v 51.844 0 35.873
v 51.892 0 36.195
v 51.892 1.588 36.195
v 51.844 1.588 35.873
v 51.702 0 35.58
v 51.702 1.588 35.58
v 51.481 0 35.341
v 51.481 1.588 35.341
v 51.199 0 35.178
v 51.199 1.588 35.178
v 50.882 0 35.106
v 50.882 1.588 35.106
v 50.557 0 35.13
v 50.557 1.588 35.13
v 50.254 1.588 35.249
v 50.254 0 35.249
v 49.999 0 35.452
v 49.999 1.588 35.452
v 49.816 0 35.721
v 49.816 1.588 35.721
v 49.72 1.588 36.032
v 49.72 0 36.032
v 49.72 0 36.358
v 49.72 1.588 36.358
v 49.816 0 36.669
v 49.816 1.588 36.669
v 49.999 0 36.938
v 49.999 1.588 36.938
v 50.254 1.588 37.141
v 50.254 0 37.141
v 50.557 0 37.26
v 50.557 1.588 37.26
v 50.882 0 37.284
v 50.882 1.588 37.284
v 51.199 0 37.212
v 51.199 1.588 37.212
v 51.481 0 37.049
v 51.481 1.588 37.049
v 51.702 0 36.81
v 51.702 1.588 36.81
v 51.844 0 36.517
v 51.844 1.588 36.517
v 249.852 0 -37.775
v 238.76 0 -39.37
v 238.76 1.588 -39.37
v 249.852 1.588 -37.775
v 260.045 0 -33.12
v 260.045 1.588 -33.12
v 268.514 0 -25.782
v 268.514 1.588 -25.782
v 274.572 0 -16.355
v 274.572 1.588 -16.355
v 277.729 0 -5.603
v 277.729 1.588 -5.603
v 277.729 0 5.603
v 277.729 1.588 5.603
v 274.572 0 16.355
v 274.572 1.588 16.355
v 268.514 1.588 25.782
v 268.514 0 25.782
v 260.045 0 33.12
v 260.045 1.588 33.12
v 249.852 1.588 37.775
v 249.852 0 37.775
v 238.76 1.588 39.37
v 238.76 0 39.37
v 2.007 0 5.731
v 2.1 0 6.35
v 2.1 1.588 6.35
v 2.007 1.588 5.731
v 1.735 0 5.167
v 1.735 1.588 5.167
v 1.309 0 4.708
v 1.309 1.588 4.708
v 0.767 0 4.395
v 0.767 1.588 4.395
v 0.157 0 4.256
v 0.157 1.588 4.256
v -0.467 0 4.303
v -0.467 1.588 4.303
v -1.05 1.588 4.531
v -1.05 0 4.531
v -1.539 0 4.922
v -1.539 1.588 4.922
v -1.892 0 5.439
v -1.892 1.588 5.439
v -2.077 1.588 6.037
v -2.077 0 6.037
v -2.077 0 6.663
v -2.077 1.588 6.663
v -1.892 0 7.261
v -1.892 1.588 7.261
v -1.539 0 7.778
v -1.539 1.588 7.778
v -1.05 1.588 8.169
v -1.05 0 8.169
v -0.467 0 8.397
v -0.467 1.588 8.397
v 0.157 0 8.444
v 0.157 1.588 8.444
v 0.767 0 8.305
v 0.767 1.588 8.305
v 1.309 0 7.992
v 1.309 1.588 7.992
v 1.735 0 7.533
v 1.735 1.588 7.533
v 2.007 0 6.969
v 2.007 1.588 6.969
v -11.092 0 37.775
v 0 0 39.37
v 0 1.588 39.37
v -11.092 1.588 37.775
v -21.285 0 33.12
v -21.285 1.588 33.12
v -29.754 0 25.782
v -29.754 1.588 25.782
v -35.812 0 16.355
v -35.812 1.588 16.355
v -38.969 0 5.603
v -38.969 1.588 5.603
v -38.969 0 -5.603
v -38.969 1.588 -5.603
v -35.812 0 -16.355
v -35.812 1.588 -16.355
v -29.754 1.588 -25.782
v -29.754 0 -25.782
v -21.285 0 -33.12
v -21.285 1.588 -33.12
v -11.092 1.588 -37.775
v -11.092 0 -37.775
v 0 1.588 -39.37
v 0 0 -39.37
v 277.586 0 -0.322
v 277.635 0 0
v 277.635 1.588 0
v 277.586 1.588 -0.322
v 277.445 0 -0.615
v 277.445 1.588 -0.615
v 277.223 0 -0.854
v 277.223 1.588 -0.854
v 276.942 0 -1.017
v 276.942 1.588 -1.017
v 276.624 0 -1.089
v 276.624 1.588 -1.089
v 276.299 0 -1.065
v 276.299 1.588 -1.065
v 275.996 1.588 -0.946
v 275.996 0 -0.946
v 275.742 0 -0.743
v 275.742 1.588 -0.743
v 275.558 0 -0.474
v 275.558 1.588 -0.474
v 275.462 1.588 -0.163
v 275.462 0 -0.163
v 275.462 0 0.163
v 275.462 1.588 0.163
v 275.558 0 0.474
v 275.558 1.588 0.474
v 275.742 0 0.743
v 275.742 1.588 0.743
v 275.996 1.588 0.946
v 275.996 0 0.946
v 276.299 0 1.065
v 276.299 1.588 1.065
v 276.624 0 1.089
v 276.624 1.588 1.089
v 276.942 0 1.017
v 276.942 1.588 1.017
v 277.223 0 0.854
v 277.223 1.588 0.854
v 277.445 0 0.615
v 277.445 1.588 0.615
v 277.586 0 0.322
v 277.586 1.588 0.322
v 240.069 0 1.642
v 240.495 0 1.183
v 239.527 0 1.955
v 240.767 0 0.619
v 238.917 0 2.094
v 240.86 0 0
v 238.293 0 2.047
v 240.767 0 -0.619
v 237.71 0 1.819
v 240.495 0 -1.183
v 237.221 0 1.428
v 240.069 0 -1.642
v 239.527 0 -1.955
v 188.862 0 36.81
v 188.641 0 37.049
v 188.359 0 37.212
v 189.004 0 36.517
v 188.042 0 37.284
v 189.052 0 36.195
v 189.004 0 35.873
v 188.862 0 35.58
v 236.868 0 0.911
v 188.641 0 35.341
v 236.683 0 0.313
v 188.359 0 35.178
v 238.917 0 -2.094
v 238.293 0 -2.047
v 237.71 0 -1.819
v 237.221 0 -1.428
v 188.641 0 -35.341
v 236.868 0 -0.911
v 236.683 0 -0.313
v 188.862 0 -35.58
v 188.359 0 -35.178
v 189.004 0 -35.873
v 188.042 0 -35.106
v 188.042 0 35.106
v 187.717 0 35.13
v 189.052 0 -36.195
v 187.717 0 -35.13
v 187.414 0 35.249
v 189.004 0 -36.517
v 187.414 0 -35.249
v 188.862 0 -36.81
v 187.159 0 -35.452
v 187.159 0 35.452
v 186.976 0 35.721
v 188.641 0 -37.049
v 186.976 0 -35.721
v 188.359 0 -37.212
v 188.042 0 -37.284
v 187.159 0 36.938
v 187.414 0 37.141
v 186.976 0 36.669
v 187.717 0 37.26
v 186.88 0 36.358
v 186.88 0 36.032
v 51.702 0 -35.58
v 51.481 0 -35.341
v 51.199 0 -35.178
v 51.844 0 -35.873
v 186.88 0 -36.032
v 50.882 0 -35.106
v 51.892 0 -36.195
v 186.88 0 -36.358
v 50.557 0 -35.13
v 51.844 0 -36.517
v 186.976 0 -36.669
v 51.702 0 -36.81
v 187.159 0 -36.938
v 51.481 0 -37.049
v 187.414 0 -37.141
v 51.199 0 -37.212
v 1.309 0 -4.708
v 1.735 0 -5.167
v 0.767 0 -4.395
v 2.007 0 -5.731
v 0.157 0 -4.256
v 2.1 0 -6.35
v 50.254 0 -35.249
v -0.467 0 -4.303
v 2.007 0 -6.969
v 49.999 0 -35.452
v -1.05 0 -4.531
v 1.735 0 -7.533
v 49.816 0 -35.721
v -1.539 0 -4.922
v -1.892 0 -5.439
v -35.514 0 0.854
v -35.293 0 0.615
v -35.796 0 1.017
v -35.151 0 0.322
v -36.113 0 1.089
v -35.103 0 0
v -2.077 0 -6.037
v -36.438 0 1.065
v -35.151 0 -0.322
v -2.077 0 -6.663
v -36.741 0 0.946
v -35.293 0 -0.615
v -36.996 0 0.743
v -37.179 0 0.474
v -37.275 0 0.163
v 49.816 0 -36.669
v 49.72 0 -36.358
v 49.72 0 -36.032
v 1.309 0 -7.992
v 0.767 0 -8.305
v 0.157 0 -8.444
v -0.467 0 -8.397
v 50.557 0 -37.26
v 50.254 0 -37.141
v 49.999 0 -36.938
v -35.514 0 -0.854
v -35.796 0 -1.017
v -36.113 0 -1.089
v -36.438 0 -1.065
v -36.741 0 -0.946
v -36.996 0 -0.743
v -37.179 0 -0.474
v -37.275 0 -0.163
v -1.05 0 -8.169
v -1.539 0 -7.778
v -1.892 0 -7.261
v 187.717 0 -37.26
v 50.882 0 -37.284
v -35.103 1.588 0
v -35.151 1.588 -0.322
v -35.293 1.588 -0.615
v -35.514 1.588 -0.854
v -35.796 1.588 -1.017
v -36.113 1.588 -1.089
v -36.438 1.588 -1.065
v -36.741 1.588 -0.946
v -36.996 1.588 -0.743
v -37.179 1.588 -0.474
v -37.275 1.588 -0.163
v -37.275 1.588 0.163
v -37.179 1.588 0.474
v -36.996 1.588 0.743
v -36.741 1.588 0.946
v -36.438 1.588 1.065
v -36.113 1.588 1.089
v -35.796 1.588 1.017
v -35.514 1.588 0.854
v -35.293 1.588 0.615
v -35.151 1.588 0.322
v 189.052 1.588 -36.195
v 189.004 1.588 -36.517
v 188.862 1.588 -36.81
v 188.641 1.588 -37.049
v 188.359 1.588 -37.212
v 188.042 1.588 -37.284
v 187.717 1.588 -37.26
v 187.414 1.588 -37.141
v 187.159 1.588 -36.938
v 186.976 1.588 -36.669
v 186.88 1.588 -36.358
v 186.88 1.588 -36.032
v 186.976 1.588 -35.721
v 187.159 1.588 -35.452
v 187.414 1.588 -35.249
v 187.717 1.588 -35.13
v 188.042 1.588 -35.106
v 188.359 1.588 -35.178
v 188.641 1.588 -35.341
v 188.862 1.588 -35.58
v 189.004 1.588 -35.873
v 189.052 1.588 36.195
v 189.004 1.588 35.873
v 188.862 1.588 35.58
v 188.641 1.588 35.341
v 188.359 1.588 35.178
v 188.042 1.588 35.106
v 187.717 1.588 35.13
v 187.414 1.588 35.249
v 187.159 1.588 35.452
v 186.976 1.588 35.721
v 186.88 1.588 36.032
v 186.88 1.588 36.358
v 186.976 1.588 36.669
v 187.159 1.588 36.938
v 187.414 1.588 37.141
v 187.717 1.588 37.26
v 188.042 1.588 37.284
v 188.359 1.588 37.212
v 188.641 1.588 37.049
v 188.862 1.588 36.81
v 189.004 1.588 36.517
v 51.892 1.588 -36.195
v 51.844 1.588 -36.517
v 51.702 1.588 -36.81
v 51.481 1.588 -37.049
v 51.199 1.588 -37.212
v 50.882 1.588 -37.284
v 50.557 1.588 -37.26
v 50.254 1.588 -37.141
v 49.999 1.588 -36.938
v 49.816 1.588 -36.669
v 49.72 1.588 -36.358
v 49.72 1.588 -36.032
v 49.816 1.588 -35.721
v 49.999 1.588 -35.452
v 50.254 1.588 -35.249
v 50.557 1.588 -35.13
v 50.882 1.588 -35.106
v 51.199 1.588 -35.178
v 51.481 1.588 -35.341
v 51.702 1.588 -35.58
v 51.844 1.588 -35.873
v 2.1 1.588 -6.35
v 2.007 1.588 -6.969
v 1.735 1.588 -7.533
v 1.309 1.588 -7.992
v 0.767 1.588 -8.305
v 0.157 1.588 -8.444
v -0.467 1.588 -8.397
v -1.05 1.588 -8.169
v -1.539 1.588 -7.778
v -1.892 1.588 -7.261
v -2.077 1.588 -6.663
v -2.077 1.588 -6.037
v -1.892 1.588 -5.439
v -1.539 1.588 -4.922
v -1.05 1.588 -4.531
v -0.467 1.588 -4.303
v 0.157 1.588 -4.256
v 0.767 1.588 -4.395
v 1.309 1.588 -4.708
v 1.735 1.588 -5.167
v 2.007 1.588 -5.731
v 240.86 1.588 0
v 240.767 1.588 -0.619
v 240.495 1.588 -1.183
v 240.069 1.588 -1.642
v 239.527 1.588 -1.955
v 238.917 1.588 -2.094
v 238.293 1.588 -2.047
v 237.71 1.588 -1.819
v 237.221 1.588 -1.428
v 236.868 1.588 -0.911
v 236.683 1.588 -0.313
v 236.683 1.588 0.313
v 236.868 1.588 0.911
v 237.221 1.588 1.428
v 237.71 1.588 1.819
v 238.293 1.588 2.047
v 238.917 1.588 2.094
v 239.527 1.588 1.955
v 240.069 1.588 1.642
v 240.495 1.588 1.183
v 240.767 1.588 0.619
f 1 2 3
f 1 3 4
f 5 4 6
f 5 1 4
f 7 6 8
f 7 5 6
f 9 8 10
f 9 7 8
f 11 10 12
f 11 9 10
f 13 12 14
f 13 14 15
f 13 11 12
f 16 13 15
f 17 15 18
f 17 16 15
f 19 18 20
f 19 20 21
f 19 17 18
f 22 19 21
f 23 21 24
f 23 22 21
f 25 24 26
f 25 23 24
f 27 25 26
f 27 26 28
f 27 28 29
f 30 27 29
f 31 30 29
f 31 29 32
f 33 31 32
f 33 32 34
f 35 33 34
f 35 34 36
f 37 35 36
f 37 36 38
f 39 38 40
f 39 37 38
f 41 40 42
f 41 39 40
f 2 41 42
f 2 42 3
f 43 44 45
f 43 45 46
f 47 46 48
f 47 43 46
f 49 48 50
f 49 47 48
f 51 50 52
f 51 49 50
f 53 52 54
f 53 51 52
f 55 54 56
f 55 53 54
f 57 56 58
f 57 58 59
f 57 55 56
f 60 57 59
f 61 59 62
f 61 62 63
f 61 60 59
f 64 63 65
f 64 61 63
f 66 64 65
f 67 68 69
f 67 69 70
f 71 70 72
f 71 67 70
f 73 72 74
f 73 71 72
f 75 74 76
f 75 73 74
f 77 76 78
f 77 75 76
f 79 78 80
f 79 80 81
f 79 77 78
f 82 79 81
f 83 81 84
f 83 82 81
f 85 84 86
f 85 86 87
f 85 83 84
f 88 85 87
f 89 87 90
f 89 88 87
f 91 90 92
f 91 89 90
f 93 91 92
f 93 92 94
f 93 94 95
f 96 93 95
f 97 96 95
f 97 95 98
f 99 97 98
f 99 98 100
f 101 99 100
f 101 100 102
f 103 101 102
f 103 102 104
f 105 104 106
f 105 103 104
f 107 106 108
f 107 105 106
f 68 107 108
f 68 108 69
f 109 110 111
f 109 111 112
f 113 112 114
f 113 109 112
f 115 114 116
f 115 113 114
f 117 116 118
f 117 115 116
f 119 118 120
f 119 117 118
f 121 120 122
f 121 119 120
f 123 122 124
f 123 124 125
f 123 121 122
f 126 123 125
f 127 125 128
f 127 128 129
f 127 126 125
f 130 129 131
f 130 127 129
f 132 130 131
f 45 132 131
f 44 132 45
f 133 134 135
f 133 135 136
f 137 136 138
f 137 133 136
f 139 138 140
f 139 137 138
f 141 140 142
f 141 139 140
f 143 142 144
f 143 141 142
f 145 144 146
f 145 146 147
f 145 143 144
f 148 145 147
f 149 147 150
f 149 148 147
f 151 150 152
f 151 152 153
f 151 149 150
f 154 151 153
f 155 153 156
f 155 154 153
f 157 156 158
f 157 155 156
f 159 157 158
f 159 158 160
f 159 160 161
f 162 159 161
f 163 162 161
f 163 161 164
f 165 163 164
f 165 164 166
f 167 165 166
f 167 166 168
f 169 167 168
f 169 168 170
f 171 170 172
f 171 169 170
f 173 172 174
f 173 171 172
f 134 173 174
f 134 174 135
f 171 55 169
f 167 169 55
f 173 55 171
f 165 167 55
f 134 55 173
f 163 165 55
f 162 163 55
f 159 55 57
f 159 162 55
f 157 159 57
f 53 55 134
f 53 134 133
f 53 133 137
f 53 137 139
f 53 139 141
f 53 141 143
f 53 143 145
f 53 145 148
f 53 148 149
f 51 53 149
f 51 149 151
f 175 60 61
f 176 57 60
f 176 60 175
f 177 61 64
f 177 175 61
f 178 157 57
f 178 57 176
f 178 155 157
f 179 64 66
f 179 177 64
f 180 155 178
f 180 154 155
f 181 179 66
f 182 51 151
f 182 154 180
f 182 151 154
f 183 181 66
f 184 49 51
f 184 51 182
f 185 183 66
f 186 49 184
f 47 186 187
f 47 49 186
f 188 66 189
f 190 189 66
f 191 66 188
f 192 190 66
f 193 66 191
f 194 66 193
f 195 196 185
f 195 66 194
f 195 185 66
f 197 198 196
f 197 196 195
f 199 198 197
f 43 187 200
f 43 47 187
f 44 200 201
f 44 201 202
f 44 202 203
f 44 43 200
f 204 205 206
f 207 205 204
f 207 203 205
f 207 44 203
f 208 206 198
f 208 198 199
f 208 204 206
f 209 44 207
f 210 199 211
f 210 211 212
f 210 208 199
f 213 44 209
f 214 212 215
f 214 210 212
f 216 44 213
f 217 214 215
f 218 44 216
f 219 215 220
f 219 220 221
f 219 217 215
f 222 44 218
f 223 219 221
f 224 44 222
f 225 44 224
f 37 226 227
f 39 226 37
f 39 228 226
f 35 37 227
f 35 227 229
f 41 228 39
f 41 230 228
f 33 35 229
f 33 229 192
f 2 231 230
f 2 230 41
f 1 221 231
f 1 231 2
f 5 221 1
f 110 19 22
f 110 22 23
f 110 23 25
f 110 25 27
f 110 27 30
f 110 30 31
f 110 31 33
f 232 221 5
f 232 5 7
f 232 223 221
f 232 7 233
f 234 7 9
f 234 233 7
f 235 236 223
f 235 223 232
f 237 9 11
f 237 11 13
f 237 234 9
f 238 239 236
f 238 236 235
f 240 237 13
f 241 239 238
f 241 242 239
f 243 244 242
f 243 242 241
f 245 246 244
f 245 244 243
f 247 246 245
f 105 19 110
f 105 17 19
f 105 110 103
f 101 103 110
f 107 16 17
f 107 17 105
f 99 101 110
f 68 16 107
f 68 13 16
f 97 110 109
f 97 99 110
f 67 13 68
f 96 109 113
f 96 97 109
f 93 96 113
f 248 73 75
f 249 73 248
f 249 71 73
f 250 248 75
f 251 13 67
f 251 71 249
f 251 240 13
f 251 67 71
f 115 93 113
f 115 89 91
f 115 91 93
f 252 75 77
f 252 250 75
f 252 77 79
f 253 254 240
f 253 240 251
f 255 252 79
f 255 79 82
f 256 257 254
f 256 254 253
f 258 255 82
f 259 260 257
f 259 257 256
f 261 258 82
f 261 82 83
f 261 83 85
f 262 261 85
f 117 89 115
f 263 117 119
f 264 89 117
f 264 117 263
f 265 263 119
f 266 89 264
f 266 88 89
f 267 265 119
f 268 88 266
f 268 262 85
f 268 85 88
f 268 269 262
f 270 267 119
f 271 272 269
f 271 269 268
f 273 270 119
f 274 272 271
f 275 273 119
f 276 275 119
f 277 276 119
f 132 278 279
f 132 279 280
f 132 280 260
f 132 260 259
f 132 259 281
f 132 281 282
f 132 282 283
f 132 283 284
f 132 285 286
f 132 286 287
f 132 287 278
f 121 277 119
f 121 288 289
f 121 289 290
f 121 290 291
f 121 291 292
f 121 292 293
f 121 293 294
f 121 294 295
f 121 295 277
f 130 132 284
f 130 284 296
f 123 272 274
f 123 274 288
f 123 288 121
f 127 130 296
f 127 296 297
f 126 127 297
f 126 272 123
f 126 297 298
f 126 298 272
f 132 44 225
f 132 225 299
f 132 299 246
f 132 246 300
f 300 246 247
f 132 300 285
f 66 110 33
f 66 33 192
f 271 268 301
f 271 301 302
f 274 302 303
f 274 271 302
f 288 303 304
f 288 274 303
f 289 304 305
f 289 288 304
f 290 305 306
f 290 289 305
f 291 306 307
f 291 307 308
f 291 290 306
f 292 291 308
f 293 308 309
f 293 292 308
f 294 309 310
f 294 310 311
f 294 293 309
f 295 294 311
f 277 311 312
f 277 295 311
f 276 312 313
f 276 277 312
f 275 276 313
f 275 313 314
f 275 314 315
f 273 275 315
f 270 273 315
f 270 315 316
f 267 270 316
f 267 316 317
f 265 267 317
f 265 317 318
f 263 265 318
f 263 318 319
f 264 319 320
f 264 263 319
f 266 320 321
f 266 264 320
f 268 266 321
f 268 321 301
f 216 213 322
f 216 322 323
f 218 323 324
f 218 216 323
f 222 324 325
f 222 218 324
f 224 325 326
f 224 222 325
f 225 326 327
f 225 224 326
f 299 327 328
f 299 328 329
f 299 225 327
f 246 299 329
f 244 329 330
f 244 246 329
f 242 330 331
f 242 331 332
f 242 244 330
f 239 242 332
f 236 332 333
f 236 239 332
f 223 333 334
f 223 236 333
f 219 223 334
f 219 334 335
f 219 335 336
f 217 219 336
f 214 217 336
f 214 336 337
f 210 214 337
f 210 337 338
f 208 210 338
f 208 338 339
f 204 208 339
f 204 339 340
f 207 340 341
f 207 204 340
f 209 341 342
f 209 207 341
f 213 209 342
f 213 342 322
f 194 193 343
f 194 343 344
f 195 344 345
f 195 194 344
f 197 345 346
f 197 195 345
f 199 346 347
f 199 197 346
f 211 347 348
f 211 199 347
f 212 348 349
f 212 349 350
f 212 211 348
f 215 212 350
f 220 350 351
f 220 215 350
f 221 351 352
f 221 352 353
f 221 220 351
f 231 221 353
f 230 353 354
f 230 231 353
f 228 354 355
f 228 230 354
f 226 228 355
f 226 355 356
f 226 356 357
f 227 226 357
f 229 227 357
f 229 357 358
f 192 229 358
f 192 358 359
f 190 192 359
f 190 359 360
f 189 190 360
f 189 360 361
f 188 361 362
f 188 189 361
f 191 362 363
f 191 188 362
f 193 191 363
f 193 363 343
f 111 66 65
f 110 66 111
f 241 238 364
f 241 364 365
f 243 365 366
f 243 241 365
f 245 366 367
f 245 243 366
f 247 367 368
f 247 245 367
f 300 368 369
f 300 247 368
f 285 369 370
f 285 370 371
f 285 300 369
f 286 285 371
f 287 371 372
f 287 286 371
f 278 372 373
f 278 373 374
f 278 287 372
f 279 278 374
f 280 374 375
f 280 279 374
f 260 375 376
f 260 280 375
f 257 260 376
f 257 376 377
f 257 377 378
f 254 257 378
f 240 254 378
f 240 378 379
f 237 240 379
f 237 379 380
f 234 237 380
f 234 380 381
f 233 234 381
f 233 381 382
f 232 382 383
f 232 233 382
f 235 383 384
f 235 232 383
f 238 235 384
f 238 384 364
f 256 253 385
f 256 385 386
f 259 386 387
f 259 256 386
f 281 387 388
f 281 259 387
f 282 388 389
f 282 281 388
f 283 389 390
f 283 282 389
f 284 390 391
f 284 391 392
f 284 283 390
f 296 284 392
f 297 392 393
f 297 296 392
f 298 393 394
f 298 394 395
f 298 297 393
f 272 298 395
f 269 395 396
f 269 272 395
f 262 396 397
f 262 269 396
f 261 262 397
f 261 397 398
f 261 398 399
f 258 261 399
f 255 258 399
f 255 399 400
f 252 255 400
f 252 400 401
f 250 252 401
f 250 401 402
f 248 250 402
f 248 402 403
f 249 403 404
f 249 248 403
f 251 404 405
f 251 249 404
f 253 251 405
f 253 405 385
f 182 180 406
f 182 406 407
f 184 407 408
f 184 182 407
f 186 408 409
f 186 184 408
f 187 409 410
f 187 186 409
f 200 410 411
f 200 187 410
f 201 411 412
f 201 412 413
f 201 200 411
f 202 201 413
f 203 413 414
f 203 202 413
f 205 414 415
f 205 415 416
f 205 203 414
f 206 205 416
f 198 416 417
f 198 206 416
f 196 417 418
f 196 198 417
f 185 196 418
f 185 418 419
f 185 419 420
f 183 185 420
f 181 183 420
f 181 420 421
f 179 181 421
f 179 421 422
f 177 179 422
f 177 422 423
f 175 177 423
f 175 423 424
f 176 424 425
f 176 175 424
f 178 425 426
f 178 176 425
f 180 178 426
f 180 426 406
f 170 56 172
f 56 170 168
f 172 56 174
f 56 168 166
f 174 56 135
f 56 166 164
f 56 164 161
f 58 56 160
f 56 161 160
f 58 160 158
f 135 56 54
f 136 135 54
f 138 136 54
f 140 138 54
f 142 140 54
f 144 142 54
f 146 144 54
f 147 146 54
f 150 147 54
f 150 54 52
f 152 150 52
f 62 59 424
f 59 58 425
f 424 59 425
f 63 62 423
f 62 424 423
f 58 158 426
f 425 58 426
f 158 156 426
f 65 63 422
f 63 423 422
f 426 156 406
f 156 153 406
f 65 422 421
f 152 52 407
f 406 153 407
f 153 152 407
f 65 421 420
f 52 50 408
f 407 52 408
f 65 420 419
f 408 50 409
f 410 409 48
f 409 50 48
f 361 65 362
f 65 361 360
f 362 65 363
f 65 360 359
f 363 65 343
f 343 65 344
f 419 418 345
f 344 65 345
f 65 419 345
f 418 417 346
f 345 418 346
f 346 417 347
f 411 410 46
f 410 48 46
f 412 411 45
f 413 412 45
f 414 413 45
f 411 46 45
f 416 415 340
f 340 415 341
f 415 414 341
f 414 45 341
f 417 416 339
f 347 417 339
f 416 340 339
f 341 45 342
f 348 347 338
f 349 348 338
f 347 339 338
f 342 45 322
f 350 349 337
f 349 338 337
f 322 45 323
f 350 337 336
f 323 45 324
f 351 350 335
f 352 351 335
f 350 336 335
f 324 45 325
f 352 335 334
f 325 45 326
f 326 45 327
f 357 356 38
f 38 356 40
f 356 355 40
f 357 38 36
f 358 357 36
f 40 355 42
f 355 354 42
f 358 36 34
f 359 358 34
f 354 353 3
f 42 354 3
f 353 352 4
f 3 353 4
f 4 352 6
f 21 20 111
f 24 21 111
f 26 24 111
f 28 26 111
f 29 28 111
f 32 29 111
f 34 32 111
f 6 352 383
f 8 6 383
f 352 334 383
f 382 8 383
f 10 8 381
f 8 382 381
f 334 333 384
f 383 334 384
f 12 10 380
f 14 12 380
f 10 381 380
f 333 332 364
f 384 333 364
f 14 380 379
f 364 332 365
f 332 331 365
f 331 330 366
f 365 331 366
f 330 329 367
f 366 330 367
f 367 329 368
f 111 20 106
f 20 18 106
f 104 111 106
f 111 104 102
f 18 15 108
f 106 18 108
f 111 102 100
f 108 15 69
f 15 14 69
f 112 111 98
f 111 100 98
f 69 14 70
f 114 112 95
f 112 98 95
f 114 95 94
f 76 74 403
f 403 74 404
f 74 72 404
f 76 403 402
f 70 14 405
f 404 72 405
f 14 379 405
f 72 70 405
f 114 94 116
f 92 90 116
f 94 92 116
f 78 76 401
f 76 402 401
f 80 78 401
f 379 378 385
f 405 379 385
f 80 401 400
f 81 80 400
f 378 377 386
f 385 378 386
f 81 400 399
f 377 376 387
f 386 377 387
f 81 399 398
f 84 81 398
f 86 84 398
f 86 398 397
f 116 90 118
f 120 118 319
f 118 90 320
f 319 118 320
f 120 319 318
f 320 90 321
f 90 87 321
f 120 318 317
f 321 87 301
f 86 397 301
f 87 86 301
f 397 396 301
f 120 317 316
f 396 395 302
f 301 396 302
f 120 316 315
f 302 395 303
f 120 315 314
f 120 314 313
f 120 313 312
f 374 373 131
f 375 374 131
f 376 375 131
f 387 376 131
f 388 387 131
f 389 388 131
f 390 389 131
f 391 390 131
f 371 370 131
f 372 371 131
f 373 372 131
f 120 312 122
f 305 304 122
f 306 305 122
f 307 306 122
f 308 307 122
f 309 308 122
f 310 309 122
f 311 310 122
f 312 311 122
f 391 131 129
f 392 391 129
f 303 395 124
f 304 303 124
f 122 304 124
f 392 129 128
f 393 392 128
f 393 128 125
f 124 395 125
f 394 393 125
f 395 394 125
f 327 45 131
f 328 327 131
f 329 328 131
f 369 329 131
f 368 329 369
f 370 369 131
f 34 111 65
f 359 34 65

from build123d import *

# Parameters (mm, degrees)
SKETCH1_R           = 1.0922
SKETCH1_R_2         = 2.1
BOSS_EXTRUDE1_DEPTH = 1.5875


with BuildPart() as part:
    # Sketch1 → Boss-Extrude1 (new body)
    with BuildSketch(Plane(origin=(0, 0, 0), x_dir=(1, 0, 0), z_dir=(0, 1, 0))):
        with BuildLine():
            Line((0, 39.37), (238.76, 39.37))
            ThreePointArc((238.76, 39.37), (278.13, 0), (238.76, -39.37))
            Line((238.76, -39.37), (0, -39.37))
            ThreePointArc((0, -39.37), (-39.37, 0), (0, 39.37))
        make_face()
        with Locations((50.8, 36.195)):
            Circle(SKETCH1_R, mode=Mode.SUBTRACT)
        with Locations((187.96, 36.195)):
            Circle(SKETCH1_R, mode=Mode.SUBTRACT)
        with Locations((50.8, -36.195)):
            Circle(SKETCH1_R, mode=Mode.SUBTRACT)
        with Locations((187.96, -36.195)):
            Circle(SKETCH1_R, mode=Mode.SUBTRACT)
        with Locations((-36.195, 0)):
            Circle(SKETCH1_R, mode=Mode.SUBTRACT)
        with Locations((276.5425, 0)):
            Circle(SKETCH1_R, mode=Mode.SUBTRACT)
        with Locations((238.76, 0)):
            Circle(SKETCH1_R_2, mode=Mode.SUBTRACT)
        with Locations((0, -6.35)):
            Circle(SKETCH1_R_2, mode=Mode.SUBTRACT)
        with Locations((0, 6.35)):
            Circle(SKETCH1_R_2, mode=Mode.SUBTRACT)
    extrude(amount=BOSS_EXTRUDE1_DEPTH)


solid = part.part
